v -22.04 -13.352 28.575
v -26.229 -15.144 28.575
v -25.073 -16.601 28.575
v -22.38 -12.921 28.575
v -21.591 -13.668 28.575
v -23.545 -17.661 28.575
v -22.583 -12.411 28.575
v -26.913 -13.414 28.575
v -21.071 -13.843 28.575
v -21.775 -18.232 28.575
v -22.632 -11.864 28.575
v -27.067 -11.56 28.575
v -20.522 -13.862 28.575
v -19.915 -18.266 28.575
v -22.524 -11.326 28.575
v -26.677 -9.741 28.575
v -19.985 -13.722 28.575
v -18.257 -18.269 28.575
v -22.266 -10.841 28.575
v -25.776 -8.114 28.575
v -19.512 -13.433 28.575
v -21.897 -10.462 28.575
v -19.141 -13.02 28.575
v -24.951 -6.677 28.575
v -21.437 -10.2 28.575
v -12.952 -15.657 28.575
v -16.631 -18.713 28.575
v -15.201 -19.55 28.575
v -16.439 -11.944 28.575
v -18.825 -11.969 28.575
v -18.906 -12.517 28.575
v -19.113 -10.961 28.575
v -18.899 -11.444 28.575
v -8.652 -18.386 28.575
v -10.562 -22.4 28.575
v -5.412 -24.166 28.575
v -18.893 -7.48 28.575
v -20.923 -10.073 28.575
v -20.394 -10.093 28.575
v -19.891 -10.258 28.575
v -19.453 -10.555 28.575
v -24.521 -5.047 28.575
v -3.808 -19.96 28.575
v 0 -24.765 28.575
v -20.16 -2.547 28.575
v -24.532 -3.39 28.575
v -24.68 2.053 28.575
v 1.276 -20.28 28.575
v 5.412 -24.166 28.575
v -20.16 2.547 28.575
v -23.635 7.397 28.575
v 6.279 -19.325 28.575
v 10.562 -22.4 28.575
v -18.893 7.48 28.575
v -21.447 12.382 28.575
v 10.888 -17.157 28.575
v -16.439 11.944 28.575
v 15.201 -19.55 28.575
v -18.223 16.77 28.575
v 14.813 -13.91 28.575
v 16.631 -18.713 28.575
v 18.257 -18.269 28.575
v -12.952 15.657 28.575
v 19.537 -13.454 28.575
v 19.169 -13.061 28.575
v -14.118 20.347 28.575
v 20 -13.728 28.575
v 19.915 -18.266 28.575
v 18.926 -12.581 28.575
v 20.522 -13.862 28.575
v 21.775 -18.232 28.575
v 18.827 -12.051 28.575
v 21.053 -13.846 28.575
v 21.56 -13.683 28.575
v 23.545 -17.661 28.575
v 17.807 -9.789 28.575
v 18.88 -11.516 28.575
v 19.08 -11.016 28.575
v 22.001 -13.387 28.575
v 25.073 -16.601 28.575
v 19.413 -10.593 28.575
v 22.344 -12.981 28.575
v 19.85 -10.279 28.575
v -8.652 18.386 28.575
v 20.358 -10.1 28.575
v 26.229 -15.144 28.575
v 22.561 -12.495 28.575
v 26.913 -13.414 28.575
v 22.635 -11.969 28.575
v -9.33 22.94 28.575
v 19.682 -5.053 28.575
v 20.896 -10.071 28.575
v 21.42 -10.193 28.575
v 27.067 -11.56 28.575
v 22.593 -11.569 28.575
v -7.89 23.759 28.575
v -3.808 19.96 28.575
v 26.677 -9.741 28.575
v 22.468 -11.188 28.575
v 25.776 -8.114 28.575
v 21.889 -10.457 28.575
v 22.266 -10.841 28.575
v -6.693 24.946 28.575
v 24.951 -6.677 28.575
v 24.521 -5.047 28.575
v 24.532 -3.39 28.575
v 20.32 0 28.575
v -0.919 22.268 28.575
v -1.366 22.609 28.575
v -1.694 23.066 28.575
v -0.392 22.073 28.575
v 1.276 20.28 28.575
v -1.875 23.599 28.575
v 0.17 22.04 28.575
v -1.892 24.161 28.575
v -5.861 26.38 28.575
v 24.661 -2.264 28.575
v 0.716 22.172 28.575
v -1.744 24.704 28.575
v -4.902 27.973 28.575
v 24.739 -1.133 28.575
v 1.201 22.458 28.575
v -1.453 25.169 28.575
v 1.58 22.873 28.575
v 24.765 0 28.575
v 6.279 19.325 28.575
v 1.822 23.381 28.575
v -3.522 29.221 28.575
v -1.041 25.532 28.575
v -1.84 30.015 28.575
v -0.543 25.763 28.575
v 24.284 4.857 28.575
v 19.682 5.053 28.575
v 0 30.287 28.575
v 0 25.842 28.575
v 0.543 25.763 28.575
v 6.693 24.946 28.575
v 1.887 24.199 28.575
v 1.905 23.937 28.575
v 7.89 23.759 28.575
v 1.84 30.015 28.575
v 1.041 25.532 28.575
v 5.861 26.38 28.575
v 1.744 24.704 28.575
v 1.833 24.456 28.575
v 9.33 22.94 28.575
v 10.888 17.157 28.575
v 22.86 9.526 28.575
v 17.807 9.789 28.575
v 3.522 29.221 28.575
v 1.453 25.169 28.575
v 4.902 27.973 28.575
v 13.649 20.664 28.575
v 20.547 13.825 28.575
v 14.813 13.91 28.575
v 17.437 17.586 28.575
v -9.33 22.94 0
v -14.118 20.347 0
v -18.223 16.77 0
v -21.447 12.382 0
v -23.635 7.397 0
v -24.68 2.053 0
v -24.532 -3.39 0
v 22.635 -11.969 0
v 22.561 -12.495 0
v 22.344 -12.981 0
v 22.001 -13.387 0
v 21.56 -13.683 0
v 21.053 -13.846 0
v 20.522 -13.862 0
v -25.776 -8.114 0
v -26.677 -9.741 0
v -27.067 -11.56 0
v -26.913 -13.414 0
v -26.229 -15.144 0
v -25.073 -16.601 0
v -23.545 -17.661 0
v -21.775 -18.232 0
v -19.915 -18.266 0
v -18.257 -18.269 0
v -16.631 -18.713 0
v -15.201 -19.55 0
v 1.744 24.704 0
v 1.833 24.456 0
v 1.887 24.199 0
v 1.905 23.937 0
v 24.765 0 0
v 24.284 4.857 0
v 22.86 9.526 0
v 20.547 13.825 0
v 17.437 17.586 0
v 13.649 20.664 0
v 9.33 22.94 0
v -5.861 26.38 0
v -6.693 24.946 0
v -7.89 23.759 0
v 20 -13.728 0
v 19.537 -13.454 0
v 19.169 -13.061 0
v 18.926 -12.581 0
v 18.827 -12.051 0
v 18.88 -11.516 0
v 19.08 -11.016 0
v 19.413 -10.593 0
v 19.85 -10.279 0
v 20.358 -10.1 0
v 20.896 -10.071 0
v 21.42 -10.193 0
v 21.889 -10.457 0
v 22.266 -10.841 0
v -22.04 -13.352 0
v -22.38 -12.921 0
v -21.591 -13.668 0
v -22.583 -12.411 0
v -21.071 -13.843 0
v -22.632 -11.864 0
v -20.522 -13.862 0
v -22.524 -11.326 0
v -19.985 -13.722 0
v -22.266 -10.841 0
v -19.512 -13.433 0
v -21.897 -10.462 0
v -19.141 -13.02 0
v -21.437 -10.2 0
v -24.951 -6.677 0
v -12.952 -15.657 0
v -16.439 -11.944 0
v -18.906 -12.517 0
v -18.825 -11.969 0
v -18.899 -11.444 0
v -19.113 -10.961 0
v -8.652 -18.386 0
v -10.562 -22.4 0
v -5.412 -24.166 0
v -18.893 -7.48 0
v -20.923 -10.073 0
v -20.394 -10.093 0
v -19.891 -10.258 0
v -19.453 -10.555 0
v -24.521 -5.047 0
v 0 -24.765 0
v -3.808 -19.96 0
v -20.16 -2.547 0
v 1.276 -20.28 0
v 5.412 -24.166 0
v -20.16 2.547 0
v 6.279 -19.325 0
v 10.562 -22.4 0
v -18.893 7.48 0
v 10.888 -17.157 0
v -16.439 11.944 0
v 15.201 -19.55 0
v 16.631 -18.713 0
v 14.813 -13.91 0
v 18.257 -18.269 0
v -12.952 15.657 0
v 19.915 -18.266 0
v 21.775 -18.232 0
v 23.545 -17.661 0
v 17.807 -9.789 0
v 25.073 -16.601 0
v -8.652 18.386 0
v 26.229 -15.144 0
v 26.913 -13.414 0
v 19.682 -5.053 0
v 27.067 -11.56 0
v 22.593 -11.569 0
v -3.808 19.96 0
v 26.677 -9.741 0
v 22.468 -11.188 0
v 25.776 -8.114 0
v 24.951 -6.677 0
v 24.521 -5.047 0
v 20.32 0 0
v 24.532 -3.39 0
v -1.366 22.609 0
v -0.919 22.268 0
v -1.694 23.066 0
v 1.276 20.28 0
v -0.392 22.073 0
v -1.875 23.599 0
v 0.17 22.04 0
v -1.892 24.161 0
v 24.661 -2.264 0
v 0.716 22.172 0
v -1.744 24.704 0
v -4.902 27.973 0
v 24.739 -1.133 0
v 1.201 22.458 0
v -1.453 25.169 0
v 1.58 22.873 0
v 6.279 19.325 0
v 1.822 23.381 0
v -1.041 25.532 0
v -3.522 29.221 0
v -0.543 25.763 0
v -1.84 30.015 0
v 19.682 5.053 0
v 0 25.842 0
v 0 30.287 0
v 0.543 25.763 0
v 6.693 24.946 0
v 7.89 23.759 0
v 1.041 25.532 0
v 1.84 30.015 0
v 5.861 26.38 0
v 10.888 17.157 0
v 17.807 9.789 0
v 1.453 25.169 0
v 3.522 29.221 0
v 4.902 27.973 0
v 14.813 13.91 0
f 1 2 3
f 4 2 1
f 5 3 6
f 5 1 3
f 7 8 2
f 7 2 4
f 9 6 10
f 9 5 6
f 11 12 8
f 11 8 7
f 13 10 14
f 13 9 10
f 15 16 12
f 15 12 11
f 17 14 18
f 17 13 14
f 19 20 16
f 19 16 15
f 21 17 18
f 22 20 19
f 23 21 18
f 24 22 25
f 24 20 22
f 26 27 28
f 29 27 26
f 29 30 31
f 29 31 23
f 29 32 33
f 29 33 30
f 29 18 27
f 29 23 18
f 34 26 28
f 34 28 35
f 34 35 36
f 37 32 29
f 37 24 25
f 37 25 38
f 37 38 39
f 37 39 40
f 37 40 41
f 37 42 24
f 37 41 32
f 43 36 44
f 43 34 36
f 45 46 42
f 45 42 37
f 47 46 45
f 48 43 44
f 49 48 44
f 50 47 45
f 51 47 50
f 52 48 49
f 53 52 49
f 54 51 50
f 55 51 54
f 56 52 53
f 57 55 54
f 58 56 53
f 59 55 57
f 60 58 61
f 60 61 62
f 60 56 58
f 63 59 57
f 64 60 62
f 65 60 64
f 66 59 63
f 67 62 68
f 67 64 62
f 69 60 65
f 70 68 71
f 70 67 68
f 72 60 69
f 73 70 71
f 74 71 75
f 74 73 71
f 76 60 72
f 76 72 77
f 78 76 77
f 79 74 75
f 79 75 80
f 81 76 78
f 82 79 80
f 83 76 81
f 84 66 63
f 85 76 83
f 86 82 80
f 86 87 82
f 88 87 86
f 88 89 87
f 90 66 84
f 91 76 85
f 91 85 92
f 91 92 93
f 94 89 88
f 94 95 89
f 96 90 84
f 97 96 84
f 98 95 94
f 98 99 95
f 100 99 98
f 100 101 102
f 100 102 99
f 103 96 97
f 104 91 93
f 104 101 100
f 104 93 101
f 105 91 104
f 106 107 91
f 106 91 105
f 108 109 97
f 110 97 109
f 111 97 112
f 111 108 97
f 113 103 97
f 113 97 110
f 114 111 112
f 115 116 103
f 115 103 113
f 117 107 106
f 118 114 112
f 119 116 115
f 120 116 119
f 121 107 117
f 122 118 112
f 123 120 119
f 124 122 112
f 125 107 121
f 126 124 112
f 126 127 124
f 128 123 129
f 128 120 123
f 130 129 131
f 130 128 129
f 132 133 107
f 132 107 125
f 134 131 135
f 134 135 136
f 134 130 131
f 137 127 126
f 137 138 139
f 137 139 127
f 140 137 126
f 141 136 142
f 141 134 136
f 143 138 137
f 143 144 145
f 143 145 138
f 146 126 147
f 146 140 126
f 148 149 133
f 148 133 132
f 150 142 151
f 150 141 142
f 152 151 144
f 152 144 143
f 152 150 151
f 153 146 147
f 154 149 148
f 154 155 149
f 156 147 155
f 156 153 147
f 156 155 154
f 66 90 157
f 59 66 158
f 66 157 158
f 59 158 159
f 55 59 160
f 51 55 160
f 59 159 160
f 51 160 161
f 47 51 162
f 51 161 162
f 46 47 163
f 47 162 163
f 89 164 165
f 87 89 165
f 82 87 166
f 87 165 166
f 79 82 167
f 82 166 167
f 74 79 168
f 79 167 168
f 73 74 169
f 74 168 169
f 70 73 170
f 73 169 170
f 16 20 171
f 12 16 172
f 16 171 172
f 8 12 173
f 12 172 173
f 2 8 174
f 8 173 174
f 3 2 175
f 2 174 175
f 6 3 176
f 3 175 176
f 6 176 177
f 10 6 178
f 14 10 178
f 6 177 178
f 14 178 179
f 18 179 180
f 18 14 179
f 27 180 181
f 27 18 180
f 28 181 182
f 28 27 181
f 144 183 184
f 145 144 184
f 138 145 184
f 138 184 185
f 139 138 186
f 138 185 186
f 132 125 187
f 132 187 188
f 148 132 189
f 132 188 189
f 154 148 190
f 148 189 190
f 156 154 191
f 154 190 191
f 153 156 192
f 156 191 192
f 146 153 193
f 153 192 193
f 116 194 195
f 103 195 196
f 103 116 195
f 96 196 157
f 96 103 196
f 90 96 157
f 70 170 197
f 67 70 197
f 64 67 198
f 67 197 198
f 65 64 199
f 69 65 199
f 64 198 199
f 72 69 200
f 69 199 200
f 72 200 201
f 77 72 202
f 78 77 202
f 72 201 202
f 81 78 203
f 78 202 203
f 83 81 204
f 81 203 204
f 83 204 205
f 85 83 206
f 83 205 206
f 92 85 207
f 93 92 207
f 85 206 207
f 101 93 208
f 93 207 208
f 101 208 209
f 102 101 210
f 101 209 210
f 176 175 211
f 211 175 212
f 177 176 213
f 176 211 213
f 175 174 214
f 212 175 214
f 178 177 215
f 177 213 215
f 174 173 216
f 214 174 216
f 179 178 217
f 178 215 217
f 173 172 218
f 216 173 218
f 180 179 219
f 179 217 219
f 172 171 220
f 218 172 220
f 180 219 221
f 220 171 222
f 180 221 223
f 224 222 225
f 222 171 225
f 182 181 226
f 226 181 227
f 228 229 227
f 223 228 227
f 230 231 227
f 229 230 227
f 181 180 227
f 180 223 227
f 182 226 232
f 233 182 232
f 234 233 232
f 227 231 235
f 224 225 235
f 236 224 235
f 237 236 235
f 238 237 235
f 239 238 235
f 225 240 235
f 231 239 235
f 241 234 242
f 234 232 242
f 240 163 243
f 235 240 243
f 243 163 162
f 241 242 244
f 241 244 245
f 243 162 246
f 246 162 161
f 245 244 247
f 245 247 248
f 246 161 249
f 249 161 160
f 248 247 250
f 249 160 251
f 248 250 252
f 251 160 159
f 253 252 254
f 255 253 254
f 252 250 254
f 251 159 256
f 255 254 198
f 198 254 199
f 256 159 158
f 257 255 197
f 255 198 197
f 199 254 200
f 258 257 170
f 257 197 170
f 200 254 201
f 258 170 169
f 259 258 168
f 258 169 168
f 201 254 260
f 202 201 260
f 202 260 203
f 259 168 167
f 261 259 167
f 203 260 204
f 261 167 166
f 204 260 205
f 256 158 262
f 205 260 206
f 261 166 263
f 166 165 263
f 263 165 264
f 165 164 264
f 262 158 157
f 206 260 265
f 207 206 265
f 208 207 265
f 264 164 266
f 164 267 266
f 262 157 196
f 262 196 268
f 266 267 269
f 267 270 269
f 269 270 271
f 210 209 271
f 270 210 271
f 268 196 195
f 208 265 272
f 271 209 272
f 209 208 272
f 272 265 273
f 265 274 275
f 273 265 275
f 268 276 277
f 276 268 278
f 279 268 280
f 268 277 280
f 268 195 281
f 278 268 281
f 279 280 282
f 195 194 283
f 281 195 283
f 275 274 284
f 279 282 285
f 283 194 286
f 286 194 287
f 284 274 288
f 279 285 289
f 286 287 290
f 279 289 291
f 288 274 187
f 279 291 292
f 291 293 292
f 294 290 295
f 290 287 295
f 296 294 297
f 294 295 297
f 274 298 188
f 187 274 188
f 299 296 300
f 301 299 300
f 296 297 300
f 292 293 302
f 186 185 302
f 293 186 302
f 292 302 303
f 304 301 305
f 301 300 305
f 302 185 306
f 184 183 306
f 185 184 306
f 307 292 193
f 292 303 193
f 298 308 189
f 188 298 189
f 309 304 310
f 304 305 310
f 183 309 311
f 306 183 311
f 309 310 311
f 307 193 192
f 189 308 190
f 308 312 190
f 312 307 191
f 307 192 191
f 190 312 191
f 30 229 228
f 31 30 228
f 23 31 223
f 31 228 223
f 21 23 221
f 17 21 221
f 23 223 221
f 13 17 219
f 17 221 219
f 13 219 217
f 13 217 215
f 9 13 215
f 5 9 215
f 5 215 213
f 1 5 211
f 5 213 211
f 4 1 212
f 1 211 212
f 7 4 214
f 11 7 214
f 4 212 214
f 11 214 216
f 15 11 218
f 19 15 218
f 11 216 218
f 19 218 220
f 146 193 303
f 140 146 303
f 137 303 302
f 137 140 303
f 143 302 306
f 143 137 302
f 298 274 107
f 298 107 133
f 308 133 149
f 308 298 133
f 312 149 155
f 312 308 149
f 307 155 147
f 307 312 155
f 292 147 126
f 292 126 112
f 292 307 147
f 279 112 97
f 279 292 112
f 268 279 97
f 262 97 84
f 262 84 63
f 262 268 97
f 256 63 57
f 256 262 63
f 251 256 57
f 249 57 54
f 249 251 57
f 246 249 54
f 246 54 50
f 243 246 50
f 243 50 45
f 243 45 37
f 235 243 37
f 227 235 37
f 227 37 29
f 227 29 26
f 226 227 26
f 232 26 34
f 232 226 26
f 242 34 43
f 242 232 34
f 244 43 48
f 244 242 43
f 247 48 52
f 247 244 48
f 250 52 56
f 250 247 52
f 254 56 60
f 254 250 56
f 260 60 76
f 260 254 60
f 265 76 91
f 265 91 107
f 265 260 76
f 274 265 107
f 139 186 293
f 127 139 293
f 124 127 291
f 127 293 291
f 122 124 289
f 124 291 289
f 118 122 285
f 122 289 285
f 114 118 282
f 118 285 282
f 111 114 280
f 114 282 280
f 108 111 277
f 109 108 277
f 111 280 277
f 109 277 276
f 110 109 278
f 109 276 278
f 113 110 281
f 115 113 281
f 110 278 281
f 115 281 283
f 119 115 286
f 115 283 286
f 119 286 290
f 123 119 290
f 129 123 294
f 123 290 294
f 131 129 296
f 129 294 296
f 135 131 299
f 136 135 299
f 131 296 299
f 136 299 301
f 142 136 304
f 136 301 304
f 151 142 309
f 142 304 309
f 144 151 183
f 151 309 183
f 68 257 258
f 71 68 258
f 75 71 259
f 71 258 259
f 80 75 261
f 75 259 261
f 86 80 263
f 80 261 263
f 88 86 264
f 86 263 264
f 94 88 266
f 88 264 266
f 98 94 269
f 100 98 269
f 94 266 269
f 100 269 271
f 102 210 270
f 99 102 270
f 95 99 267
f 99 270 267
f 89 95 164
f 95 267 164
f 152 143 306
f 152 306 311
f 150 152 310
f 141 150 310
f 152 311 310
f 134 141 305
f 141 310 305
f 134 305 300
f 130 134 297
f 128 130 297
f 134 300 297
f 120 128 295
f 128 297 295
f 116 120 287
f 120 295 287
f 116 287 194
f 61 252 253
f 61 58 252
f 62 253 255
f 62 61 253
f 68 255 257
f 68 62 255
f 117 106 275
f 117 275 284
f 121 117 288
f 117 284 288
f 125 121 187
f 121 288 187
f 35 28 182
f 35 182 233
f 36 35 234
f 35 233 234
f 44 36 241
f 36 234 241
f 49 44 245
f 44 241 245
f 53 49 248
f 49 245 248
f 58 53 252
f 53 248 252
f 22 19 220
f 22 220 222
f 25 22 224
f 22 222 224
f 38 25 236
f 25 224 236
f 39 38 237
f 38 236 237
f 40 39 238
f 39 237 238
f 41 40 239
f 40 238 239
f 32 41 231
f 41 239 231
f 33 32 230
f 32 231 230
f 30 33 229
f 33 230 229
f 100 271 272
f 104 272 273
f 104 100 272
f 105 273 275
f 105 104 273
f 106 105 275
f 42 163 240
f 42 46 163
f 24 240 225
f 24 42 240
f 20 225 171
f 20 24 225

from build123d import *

# Parameters (mm, degrees)
F0_R     = 20.32
F1_DEPTH = 28.575
F2_R     = 6.35


with BuildPart() as f1:
    # F0 (on Top) → F1 (new body)
    with BuildSketch(Plane.XY):
        with BuildLine():
            ThreePointArc((23.9050999455, -6.4692674698), (24.5490837421, -3.2630832697), (24.765, 0))
            ThreePointArc((24.765, 0), (19.6285885254, 15.1004548773), (6.35, 23.9370575677))
            ThreePointArc((6.35, 23.9370575677), (4.0651088886, 24.4290833787), (1.7440091422, 24.703515076))
            ThreePointArc((1.7440091422, 24.703515076), (1.8643178935, 24.3286489263), (1.905, 23.9370575677))
            ThreePointArc((1.905, 23.9370575677), (-0.3915913586, 22.0727396742), (-1.7440091422, 24.703515076))
            ThreePointArc((-1.7440091422, 24.703515076), (-4.0651088886, 24.4290833787), (-6.35, 23.9370575677))
            ThreePointArc((-6.35, 23.9370575677), (-21.4471191247, 12.3825), (-23.9050999455, -6.4692674698))
            ThreePointArc((-23.9050999455, -6.4692674698), (-23.1887612414, -8.6940541227), (-22.2658761897, -10.8414013165))
            ThreePointArc((-22.2658761897, -10.8414013165), (-20.1370690632, -10.1581864481), (-18.8250999455, -11.9685287839))
            ThreePointArc((-18.8250999455, -11.9685287839), (-19.3113489683, -13.239815795), (-20.5218670475, -13.8621137596))
            ThreePointArc((-20.5218670475, -13.8621137596), (-19.1236523528, -15.735029256), (-17.5550999455, -17.4677900979))
            ThreePointArc((-17.5550999455, -17.4677900979), (0, -24.765), (17.5550999455, -17.4677900979))
            ThreePointArc((17.5550999455, -17.4677900979), (19.1236523528, -15.735029256), (20.5218670475, -13.8621137596))
            ThreePointArc((20.5218670475, -13.8621137596), (19.0803215513, -11.0160287839), (22.2658761897, -10.8414013165))
            ThreePointArc((22.2658761897, -10.8414013165), (23.1887612414, -8.6940541227), (23.9050999455, -6.4692674698))
        make_face()
        Circle(F0_R, mode=Mode.SUBTRACT)
        with BuildLine():
            ThreePointArc((-22.2658761897, -10.8414013165), (-23.1887612414, -8.6940541227), (-23.9050999455, -6.4692674698))
            ThreePointArc((-23.9050999455, -6.4692674698), (-26.2293612595, -15.1435287839), (-17.5550999455, -17.4677900979))
            ThreePointArc((-17.5550999455, -17.4677900979), (-19.1236523528, -15.735029256), (-20.5218670475, -13.8621137596))
            ThreePointArc((-20.5218670475, -13.8621137596), (-22.3798783397, -12.9210287839), (-22.2658761897, -10.8414013165))
        make_face()
        with BuildLine():
            ThreePointArc((1.7440091422, 24.703515076), (4.0651088886, 24.4290833787), (6.35, 23.9370575677))
            ThreePointArc((6.35, 23.9370575677), (0, 30.2870575677), (-6.35, 23.9370575677))
            ThreePointArc((-6.35, 23.9370575677), (-4.0651088886, 24.4290833787), (-1.7440091422, 24.703515076))
            ThreePointArc((-1.7440091422, 24.703515076), (0, 25.8420575677), (1.7440091422, 24.703515076))
        make_face()
        with BuildLine():
            ThreePointArc((17.5550999455, -17.4677900979), (26.2293612595, -15.1435287839), (23.9050999455, -6.4692674698))
            ThreePointArc((23.9050999455, -6.4692674698), (23.1887612414, -8.6940541227), (22.2658761897, -10.8414013165))
            ThreePointArc((22.2658761897, -10.8414013165), (22.5404422812, -11.3754979015), (22.6350999455, -11.9685287839))
            ThreePointArc((22.6350999455, -11.9685287839), (22.0013869566, -13.3872797611), (20.5218670475, -13.8621137596))
            ThreePointArc((20.5218670475, -13.8621137596), (19.1236523528, -15.735029256), (17.5550999455, -17.4677900979))
        make_face()
    extrude(amount=F1_DEPTH)

    # F2
    f2_edges = [f1.edges().sort_by_distance(p)[0] for p in [
        (6.35, 23.937058, 14.2875),
        (-23.9051, -6.469267, 14.2875),
        (17.5551, -17.46779, 14.2875),
        (23.9051, -6.469267, 14.2875),
        (-6.35, 23.937058, 14.2875),
        (-17.5551, -17.46779, 14.2875),
    ]]
    fillet(f2_edges, radius=F2_R)


solid = f1.part
